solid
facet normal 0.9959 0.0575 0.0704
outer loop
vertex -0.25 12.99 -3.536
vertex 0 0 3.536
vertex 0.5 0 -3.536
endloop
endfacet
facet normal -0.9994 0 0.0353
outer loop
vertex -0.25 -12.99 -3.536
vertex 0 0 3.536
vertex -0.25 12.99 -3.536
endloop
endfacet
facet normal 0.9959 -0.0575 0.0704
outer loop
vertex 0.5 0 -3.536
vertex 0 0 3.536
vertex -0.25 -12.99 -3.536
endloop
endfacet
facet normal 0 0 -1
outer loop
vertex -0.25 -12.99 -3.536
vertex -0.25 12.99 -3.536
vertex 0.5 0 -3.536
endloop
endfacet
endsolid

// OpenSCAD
$fn = 3;
scale(v = [0.1, 3, 1])
	cylinder(h = sqrt(2) * 5, r1 = 5, r2 = 0, center = true);
